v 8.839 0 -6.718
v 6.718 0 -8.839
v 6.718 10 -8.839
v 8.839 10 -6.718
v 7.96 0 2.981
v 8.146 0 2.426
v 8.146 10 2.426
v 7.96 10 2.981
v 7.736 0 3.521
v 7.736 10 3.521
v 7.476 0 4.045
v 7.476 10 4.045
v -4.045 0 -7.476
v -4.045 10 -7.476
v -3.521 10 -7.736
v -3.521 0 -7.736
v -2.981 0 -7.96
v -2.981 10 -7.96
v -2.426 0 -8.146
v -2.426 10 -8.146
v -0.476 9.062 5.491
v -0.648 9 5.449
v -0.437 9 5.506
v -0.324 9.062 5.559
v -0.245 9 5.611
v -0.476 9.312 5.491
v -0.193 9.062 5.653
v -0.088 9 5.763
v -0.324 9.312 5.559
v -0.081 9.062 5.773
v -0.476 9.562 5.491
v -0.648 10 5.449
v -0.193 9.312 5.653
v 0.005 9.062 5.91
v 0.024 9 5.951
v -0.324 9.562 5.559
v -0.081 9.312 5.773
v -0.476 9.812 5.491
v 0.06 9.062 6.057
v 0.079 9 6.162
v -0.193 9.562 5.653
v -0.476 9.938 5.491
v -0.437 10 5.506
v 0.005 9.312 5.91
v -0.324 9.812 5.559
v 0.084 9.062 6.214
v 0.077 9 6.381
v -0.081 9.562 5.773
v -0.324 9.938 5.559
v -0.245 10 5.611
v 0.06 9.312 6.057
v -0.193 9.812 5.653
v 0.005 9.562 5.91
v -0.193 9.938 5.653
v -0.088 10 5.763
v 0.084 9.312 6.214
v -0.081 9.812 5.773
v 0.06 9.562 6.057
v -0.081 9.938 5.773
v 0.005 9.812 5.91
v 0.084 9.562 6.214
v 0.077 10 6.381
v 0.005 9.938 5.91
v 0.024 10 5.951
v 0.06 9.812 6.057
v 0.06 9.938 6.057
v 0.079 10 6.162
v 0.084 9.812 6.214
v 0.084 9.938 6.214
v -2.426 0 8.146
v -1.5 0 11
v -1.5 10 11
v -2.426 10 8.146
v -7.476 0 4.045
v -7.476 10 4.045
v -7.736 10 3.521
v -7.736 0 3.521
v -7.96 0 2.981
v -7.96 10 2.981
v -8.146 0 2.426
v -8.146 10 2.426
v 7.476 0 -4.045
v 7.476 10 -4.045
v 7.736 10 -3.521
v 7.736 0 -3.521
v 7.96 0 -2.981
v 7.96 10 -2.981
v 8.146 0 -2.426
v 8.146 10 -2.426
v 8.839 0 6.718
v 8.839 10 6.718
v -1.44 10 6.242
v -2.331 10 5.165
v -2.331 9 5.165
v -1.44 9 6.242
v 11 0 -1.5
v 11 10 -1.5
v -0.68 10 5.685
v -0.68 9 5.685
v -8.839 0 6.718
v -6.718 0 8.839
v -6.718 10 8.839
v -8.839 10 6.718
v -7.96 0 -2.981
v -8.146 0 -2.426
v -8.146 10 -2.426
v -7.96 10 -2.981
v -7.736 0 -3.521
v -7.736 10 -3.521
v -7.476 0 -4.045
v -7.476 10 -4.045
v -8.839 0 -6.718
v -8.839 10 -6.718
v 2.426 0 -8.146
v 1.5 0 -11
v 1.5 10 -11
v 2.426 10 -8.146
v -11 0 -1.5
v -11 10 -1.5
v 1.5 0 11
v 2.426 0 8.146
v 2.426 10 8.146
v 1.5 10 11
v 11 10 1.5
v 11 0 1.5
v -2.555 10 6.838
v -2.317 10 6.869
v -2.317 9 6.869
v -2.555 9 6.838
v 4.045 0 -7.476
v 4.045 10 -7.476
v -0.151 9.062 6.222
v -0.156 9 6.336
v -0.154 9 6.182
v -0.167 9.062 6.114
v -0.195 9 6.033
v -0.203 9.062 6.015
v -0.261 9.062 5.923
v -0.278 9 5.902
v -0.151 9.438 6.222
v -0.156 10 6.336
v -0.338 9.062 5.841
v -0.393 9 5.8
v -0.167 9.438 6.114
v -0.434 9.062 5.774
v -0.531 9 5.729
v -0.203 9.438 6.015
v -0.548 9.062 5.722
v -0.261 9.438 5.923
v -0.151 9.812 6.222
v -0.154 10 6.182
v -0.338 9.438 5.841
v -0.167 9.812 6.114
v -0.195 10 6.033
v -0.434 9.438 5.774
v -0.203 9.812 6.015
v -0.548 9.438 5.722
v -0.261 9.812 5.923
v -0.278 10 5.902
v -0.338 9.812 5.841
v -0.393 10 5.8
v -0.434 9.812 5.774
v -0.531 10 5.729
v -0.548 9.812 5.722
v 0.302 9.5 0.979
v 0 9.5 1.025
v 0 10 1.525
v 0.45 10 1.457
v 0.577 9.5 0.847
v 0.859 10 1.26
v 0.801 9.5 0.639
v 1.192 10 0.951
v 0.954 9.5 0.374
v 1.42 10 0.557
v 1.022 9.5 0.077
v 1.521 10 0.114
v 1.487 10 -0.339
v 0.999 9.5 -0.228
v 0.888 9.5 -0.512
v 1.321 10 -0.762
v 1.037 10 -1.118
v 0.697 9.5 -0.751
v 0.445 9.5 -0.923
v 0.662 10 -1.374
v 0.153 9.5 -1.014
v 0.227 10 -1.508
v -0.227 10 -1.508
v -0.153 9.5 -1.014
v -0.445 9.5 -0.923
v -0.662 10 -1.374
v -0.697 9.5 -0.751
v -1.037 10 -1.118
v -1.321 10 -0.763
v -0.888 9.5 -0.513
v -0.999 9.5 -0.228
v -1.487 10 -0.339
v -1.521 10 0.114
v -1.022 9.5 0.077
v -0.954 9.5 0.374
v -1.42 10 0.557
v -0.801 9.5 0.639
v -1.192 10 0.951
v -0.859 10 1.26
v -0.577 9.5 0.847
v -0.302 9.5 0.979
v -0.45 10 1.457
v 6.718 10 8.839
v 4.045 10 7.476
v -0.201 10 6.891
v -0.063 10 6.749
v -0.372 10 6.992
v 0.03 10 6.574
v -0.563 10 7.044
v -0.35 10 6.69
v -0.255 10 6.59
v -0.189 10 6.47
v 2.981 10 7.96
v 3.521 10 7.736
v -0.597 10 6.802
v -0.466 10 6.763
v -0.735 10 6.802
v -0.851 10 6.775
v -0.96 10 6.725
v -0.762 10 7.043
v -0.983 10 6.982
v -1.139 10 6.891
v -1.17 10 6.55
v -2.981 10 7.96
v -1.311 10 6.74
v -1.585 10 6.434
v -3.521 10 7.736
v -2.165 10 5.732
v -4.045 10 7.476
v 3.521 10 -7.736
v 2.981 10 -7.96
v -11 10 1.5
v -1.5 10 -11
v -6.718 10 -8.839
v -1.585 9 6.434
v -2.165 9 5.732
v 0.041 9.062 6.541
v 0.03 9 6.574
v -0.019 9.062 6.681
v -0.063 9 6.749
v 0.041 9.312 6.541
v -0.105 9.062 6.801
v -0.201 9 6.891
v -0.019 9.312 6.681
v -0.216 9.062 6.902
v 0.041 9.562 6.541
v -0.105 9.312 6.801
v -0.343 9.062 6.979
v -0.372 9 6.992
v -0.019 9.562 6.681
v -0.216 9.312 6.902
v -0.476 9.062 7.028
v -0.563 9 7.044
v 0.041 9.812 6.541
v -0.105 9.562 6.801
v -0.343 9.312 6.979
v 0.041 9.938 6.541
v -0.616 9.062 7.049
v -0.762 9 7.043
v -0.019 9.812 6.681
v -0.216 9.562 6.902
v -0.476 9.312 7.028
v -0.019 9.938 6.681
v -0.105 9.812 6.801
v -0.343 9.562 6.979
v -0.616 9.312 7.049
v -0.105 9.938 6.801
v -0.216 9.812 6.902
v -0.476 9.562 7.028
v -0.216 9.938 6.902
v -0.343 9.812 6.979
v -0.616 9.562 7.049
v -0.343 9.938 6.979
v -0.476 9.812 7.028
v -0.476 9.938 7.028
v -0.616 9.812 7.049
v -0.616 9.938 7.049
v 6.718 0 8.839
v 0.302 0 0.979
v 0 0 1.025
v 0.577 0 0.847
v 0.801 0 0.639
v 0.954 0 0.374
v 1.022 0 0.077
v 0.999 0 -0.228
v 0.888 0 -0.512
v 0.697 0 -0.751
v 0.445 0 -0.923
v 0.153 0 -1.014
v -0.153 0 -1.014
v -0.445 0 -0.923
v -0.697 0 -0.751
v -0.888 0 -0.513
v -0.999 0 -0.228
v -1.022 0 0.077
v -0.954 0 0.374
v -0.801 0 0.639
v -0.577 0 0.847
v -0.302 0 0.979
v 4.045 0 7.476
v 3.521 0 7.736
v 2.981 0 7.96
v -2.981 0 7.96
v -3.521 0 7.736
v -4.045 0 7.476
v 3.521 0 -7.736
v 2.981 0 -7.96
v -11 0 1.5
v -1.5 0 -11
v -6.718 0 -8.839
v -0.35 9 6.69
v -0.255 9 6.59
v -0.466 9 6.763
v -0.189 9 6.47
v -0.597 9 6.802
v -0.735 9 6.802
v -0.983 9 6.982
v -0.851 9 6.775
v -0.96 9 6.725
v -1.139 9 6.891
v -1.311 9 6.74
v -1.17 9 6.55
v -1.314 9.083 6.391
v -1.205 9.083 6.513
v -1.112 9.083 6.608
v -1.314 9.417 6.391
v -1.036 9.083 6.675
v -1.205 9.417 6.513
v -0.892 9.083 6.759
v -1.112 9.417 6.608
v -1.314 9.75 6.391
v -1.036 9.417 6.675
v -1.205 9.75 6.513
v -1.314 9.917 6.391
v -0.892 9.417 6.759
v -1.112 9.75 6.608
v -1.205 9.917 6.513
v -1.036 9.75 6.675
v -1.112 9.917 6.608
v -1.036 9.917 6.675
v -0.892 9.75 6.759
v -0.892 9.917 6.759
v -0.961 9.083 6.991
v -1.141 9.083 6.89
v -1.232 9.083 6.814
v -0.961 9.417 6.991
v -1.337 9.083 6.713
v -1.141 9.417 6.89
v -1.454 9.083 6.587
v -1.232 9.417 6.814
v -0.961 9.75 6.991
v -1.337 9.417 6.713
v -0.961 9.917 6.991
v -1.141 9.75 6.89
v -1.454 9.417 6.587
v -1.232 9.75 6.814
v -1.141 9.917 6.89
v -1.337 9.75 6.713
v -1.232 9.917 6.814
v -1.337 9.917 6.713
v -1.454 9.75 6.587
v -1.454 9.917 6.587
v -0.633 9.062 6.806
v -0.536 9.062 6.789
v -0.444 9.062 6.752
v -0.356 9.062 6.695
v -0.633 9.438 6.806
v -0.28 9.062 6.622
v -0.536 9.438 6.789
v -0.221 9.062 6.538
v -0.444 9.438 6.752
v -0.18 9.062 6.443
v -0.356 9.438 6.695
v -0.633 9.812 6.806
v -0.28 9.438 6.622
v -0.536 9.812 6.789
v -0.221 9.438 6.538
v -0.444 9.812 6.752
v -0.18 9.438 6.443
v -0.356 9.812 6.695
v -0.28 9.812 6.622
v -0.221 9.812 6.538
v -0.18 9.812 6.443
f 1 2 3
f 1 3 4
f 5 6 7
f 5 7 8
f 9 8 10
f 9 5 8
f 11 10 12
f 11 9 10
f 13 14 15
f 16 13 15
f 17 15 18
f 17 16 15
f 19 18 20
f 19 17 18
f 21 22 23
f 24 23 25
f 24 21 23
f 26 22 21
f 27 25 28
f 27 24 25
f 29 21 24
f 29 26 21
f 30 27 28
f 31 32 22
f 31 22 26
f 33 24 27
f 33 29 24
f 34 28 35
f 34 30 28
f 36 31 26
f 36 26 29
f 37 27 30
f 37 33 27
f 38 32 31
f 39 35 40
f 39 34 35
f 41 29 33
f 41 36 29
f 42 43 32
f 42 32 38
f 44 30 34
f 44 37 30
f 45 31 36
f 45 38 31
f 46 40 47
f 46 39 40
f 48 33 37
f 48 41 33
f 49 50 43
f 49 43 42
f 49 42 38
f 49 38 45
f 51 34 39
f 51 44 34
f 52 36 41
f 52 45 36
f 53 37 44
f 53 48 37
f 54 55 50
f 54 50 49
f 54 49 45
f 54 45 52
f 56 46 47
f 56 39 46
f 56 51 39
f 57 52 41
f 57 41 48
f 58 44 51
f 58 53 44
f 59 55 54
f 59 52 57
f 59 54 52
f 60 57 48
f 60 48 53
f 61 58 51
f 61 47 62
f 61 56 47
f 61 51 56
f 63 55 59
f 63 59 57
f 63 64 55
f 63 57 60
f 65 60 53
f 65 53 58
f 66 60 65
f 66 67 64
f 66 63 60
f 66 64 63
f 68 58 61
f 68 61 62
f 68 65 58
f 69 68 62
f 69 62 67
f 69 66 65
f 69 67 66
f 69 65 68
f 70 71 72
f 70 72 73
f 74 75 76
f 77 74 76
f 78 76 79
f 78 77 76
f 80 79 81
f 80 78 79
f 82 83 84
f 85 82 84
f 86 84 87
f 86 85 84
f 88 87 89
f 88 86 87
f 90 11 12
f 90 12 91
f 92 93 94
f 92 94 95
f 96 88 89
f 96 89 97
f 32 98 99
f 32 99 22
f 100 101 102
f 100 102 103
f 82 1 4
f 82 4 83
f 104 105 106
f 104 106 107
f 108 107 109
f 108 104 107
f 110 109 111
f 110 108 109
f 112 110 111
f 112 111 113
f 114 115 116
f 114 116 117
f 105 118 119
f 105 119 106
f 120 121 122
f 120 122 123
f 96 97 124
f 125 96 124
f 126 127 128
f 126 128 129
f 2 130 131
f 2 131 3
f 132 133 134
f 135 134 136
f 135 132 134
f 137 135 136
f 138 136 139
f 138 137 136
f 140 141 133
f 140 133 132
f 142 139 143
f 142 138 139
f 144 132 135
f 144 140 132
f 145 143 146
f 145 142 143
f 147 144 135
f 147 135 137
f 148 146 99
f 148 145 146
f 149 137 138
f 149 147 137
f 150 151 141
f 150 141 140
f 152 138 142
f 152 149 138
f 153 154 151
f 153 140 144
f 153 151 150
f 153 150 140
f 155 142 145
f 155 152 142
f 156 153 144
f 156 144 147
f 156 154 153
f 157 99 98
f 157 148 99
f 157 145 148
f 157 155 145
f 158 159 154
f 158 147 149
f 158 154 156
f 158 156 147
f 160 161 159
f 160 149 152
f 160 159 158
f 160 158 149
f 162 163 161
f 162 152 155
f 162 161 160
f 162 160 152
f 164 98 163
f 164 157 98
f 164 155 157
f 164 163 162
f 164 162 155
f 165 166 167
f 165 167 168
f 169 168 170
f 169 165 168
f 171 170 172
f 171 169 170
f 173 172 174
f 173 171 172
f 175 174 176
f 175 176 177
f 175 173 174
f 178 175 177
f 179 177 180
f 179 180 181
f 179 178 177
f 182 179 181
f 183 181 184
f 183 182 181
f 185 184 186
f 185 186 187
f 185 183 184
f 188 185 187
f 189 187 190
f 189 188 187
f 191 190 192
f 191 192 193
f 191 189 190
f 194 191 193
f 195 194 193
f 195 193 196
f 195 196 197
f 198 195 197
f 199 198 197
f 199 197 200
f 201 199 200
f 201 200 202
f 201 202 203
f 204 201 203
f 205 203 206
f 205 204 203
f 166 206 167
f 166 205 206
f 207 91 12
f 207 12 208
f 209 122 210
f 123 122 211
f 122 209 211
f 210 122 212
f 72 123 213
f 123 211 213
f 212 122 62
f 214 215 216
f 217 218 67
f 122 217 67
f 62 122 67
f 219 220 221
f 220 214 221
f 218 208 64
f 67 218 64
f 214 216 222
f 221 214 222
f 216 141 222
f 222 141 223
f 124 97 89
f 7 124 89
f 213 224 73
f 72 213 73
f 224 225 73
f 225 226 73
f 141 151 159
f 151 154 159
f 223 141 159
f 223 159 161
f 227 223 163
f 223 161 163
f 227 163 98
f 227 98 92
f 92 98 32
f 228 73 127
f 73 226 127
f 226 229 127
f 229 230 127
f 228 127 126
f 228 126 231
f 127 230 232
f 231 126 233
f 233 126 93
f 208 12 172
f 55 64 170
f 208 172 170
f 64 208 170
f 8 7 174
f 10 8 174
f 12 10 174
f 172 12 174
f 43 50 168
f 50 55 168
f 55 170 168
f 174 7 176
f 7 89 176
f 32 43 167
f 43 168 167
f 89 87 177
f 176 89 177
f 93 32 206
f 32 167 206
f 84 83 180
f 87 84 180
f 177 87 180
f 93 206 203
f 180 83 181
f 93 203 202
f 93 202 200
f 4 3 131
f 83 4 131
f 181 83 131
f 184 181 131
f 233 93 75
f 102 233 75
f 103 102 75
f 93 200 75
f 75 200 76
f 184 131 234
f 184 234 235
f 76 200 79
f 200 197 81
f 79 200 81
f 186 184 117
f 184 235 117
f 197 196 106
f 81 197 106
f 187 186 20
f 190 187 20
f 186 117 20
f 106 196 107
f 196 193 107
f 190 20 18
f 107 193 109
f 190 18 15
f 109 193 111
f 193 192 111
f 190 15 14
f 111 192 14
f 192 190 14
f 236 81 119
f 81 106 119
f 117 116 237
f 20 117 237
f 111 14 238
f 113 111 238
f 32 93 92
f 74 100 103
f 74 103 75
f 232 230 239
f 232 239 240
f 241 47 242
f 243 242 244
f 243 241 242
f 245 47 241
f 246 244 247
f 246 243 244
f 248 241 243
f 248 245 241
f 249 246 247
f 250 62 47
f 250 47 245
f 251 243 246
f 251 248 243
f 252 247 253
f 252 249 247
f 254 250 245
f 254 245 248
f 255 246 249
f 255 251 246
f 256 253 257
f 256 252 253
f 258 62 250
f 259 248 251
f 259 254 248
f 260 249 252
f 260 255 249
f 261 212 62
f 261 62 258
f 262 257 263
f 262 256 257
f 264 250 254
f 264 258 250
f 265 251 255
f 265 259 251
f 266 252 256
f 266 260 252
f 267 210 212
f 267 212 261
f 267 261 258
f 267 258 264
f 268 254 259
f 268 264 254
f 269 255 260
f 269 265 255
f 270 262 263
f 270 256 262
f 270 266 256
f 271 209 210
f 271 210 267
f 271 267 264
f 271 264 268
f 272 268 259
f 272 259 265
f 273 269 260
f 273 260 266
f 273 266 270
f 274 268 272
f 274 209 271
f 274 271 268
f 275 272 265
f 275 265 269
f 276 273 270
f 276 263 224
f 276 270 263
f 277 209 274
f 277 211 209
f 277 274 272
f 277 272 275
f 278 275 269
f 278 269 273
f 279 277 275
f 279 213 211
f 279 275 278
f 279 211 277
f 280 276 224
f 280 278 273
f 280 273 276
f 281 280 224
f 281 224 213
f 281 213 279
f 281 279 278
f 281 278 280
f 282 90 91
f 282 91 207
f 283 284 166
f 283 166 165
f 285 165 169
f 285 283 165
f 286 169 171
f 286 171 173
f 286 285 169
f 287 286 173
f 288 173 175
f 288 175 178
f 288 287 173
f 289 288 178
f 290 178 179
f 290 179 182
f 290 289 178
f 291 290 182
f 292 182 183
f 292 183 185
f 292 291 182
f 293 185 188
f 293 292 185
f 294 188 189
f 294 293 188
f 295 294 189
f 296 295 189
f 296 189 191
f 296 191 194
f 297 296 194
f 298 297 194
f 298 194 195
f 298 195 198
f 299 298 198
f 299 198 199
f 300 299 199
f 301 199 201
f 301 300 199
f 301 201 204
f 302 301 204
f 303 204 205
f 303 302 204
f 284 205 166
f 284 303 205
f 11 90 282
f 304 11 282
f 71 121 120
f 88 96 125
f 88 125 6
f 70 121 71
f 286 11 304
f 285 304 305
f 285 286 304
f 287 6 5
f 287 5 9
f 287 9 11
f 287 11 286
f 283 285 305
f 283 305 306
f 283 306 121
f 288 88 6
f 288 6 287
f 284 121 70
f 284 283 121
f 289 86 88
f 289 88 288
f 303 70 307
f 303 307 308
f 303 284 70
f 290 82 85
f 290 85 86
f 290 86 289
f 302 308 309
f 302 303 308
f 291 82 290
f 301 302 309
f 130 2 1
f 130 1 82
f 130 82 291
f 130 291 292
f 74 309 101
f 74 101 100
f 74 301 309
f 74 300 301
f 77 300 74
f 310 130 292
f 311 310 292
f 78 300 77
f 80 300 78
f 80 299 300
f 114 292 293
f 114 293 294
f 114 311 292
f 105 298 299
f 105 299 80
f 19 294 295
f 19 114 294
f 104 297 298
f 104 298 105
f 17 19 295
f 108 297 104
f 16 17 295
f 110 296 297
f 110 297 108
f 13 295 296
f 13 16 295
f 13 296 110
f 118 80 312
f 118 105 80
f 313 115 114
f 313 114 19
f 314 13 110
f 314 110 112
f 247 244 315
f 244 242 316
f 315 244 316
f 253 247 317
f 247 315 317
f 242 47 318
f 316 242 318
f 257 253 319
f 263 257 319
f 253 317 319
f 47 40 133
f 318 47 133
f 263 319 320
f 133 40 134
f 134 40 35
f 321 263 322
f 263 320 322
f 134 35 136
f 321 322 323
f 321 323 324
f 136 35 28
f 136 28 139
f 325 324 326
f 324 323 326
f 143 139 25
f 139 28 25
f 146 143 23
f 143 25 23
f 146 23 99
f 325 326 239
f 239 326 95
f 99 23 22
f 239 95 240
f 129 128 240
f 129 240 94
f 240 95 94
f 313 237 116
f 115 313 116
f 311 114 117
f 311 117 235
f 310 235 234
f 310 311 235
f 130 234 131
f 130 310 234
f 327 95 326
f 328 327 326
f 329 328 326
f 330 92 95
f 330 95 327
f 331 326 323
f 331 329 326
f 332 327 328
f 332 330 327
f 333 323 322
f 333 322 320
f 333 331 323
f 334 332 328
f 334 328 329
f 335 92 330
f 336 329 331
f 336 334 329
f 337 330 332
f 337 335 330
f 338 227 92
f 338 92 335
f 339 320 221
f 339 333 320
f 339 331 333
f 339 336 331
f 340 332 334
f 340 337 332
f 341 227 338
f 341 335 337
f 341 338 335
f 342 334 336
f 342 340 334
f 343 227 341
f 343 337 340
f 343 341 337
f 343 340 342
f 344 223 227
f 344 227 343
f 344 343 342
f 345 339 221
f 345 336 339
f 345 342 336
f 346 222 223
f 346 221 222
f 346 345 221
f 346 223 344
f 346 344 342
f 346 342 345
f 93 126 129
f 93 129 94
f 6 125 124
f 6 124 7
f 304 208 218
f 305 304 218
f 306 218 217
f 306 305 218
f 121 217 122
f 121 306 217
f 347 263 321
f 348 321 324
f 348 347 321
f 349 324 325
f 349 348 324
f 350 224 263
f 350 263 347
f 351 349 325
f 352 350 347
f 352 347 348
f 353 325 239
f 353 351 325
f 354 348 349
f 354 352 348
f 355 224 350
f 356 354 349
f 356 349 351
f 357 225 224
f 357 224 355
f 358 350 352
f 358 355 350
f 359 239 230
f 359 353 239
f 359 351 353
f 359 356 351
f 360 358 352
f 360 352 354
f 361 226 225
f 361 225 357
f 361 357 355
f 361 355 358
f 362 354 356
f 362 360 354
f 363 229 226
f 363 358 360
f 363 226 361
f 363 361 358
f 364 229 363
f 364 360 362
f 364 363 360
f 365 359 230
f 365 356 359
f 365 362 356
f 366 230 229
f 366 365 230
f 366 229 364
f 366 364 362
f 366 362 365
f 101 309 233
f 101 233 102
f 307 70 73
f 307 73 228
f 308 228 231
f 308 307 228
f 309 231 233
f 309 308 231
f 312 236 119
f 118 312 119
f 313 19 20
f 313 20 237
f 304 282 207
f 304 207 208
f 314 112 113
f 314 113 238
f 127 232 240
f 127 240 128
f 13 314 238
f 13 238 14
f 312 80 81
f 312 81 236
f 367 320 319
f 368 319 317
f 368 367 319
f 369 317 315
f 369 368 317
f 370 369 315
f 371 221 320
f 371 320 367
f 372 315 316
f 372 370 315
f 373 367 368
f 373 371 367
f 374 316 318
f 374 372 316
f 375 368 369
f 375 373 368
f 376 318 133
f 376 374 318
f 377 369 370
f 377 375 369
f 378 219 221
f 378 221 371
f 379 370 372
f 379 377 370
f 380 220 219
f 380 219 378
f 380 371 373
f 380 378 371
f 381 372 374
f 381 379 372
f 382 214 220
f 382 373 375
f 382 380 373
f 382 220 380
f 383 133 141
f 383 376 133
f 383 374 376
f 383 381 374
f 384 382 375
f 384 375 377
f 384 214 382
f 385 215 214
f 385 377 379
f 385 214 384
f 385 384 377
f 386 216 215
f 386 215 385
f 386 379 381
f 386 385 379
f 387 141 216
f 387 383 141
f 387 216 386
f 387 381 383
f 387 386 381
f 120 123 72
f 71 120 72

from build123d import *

# Parameters (mm, degrees)
SKETCH1_R           = 1.025
BOSS_EXTRUDE1_DEPTH = 10
CUT_EXTRUDE1_DEPTH  = 1
CHAMFER1_SIZE       = 0.5


with BuildPart() as part:
    # Sketch1 → Boss-Extrude1 (new body)
    with BuildSketch(Plane(origin=(0, 0, 0), x_dir=(1, 0, 0), z_dir=(0, 1, 0))):
        with BuildLine():
            Line((-1.5, 11), (1.5, 11))
            Line((1.5, 11), (2.425924848, 8.146464793))
            ThreePointArc((2.425924848, 8.146464793), (3.252809175, 7.852976026), (4.045032587, 7.475808409))
            Line((4.045032587, 7.475808409), (6.717514421, 8.838834765))
            Line((6.717514421, 8.838834765), (8.838834765, 6.717514421))
            Line((8.838834765, 6.717514421), (7.475808409, 4.045032587))
            ThreePointArc((7.475808409, 4.045032587), (7.852976026, 3.252809175), (8.146464793, 2.425924848))
            Line((8.146464793, 2.425924848), (11, 1.5))
            Line((11, 1.5), (11, -1.5))
            Line((11, -1.5), (8.146464793, -2.425924848))
            ThreePointArc((8.146464793, -2.425924848), (7.852976026, -3.252809175), (7.475808409, -4.045032587))
            Line((7.475808409, -4.045032587), (8.838834765, -6.717514421))
            Line((8.838834765, -6.717514421), (6.717514421, -8.838834765))
            Line((6.717514421, -8.838834765), (4.045032587, -7.475808409))
            ThreePointArc((4.045032587, -7.475808409), (3.252809175, -7.852976026), (2.425924848, -8.146464793))
            Line((2.425924848, -8.146464793), (1.5, -11))
            Line((1.5, -11), (-1.5, -11))
            Line((-1.5, -11), (-2.425924848, -8.146464793))
            ThreePointArc((-2.425924848, -8.146464793), (-3.252809175, -7.852976026), (-4.045032587, -7.475808409))
            Line((-4.045032587, -7.475808409), (-6.717514421, -8.838834765))
            Line((-6.717514421, -8.838834765), (-8.838834765, -6.717514421))
            Line((-8.838834765, -6.717514421), (-7.475808409, -4.045032587))
            ThreePointArc((-7.475808409, -4.045032587), (-7.852976026, -3.252809175), (-8.146464793, -2.425924848))
            Line((-8.146464793, -2.425924848), (-11, -1.5))
            Line((-11, -1.5), (-11, 1.5))
            Line((-11, 1.5), (-8.146464793, 2.425924848))
            ThreePointArc((-8.146464793, 2.425924848), (-7.852976026, 3.252809175), (-7.475808409, 4.045032587))
            Line((-7.475808409, 4.045032587), (-8.838834765, 6.717514421))
            Line((-8.838834765, 6.717514421), (-6.717514421, 8.838834765))
            Line((-6.717514421, 8.838834765), (-4.045032587, 7.475808409))
            ThreePointArc((-4.045032587, 7.475808409), (-3.252809175, 7.852976026), (-2.425924848, 8.146464793))
            Line((-2.425924848, 8.146464793), (-1.5, 11))
        make_face()
        with Locations(Location((0, 0, 0), (0, 0, 270))):
            Circle(SKETCH1_R, mode=Mode.SUBTRACT)
    extrude(amount=BOSS_EXTRUDE1_DEPTH)

    # Sketch2 → Cut-Extrude1 (cut)
    with BuildSketch(Plane(origin=(0, 10, 0), x_dir=(1, 0, 0), z_dir=(0, 1, 0))):
        with BuildLine():
            Line((-0.67951288, -5.685173621), (-0.647962399, -5.449296217))
            add(Edge.make_bspline(
                [(-0.647962399, -5.449296217), (-0.618308174, -5.454820304), (-0.560284153, -5.465629209), (-0.476362431, -5.48984076), (-0.397731022, -5.521051701), (-0.323681884, -5.55793727), (-0.2551006, -5.601861634), (-0.191688594, -5.652375632), (-0.132801937, -5.708925264), (-0.0801525, -5.772097211), (-0.033306561, -5.838981745), (0.006196757, -5.909238602), (0.037797909, -5.981878785), (0.061604112, -6.057047051), (0.077052172, -6.134660608), (0.08492264, -6.214640896), (0.085830566, -6.29719701), (0.079775803, -6.352610008), (0.076697056, -6.380786602)],
                knots=[0, 0, 0, 0, 1.100859962, 2.154037817, 3.182825855, 4.185872747, 5.169851411, 6.150256119, 7.141625092, 8.14517181, 9.147774204, 10.119215176, 11.08276616, 12.034993632, 12.992414738, 13.96637616, 14.965935861, 16, 16, 16, 16], degree=3))
            add(Edge.make_bspline(
                [(0.076697056, -6.380786602), (0.072393378, -6.408440649), (0.063964293, -6.462603227), (0.04245955, -6.540444475), (0.015673176, -6.613601341), (-0.018163052, -6.681449321), (-0.057782709, -6.744623459), (-0.104369947, -6.802540115), (-0.156916189, -6.855759765), (-0.215482247, -6.903032984), (-0.277774366, -6.944150039), (-0.342035354, -6.979710839), (-0.408235726, -7.007659397), (-0.475930945, -7.029042638), (-0.545273153, -7.043093792), (-0.616231572, -7.049848725), (-0.688708826, -7.050812711), (-0.737134817, -7.045523091), (-0.76164429, -7.042845897)],
                knots=[0, 0, 0, 0, 1.125087727, 2.203570911, 3.242694659, 4.254840133, 5.247912274, 6.236956909, 7.238958616, 8.25110409, 9.25878367, 10.238550544, 11.20150929, 12.144591564, 13.090252789, 14.041833295, 15.008928189, 16, 16, 16, 16], degree=3))
            add(Edge.make_bspline(
                [(-0.76164429, -7.042845897), (-0.795911856, -7.037073204), (-0.863853491, -7.025627798), (-0.961802832, -6.992522173), (-1.055166763, -6.948613121), (-1.128556526, -6.900437931), (-1.18688245, -6.854457889), (-1.234181818, -6.813349399), (-1.285078121, -6.766197674), (-1.338253587, -6.711815369), (-1.395526889, -6.651708318), (-1.456041505, -6.585144653), (-1.519640402, -6.511855414), (-1.562672338, -6.460481627), (-1.584961598, -6.433871538)],
                knots=[0, 0, 0, 0, 1.188707215, 2.356826555, 3.52825813, 4.714611235, 5.354043377, 6.071637886, 6.860592227, 7.729914435, 8.676361207, 9.70450881, 10.811004006, 12, 12, 12, 12], degree=3))
            Line((-1.584961598, -6.433871538), (-2.164889482, -5.732248942))
            Line((-2.164889482, -5.732248942), (-2.316632271, -6.869067852))
            Line((-2.316632271, -6.869067852), (-2.55451288, -6.837517371))
            Line((-2.55451288, -6.837517371), (-2.331155508, -5.164841089))
            Line((-2.331155508, -5.164841089), (-1.440230027, -6.241563846))
            add(Edge.make_bspline(
                [(-1.440230027, -6.241563846), (-1.418649822, -6.267874505), (-1.377249469, -6.318349956), (-1.315768194, -6.38934036), (-1.259427886, -6.454151648), (-1.206885587, -6.511815526), (-1.158177578, -6.562464113), (-1.114045746, -6.606526292), (-1.073683056, -6.643345812), (-1.026325868, -6.683346431), (-0.967044732, -6.723557397), (-0.892856227, -6.760623309), (-0.81553634, -6.788990522), (-0.761683927, -6.797953641), (-0.734601021, -6.802461281)],
                knots=[0, 0, 0, 0, 1.32529596, 2.542502302, 3.657515733, 4.670000406, 5.580482446, 6.394245158, 7.098391746, 7.707758491, 8.807790529, 9.877823122, 10.932736443, 12, 12, 12, 12], degree=3))
            add(Edge.make_bspline(
                [(-0.734601021, -6.802461281), (-0.717426635, -6.80438222), (-0.68363806, -6.80816144), (-0.633127366, -6.806556794), (-0.583869632, -6.801558493), (-0.535919132, -6.790163413), (-0.489098591, -6.774099208), (-0.443345088, -6.752865521), (-0.398672819, -6.726802578), (-0.35592185, -6.695740886), (-0.315566891, -6.661189714), (-0.279504864, -6.622950363), (-0.247530448, -6.582201059), (-0.220631343, -6.538310443), (-0.197234923, -6.492062695), (-0.178790476, -6.442668271), (-0.164583049, -6.390524125), (-0.15900309, -6.354480024), (-0.15617554, -6.336215288)],
                knots=[0, 0, 0, 0, 1.002635519, 1.972567043, 2.928877794, 3.874508698, 4.828259305, 5.800176361, 6.799758996, 7.8278638, 8.866026664, 9.881245134, 10.876349012, 11.869324323, 12.866787948, 13.882608331, 14.927047686, 16, 16, 16, 16], degree=3))
            add(Edge.make_bspline(
                [(-0.15617554, -6.336215288), (-0.15395807, -6.316878514), (-0.149590127, -6.278789182), (-0.149692165, -6.222212083), (-0.155357805, -6.167410823), (-0.165690288, -6.114526465), (-0.181382515, -6.063304443), (-0.202439411, -6.014053189), (-0.229260456, -5.966903638), (-0.260809506, -5.921672896), (-0.297362541, -5.879390265), (-0.338000583, -5.839781192), (-0.384025516, -5.804833072), (-0.434318992, -5.773209858), (-0.489037939, -5.745030253), (-0.548513417, -5.721234969), (-0.612167638, -5.700363512), (-0.656711876, -5.690316446), (-0.67951288, -5.685173621)],
                knots=[0, 0, 0, 0, 1.003940432, 1.977549207, 2.912892054, 3.843939206, 4.754223491, 5.672869237, 6.602639779, 7.549185681, 8.514563016, 9.483432891, 10.472624027, 11.490954394, 12.546793215, 13.644379156, 14.7942207, 16, 16, 16, 16], degree=3))
        make_face()
    extrude(amount=-CUT_EXTRUDE1_DEPTH, mode=Mode.SUBTRACT)

    # Chamfer1
    chamfer1_edges = [part.edges().sort_by_distance(p)[0] for p in [
        (0, 10, -1.025),
    ]]
    chamfer(chamfer1_edges, length=CHAMFER1_SIZE)


solid = part.part
